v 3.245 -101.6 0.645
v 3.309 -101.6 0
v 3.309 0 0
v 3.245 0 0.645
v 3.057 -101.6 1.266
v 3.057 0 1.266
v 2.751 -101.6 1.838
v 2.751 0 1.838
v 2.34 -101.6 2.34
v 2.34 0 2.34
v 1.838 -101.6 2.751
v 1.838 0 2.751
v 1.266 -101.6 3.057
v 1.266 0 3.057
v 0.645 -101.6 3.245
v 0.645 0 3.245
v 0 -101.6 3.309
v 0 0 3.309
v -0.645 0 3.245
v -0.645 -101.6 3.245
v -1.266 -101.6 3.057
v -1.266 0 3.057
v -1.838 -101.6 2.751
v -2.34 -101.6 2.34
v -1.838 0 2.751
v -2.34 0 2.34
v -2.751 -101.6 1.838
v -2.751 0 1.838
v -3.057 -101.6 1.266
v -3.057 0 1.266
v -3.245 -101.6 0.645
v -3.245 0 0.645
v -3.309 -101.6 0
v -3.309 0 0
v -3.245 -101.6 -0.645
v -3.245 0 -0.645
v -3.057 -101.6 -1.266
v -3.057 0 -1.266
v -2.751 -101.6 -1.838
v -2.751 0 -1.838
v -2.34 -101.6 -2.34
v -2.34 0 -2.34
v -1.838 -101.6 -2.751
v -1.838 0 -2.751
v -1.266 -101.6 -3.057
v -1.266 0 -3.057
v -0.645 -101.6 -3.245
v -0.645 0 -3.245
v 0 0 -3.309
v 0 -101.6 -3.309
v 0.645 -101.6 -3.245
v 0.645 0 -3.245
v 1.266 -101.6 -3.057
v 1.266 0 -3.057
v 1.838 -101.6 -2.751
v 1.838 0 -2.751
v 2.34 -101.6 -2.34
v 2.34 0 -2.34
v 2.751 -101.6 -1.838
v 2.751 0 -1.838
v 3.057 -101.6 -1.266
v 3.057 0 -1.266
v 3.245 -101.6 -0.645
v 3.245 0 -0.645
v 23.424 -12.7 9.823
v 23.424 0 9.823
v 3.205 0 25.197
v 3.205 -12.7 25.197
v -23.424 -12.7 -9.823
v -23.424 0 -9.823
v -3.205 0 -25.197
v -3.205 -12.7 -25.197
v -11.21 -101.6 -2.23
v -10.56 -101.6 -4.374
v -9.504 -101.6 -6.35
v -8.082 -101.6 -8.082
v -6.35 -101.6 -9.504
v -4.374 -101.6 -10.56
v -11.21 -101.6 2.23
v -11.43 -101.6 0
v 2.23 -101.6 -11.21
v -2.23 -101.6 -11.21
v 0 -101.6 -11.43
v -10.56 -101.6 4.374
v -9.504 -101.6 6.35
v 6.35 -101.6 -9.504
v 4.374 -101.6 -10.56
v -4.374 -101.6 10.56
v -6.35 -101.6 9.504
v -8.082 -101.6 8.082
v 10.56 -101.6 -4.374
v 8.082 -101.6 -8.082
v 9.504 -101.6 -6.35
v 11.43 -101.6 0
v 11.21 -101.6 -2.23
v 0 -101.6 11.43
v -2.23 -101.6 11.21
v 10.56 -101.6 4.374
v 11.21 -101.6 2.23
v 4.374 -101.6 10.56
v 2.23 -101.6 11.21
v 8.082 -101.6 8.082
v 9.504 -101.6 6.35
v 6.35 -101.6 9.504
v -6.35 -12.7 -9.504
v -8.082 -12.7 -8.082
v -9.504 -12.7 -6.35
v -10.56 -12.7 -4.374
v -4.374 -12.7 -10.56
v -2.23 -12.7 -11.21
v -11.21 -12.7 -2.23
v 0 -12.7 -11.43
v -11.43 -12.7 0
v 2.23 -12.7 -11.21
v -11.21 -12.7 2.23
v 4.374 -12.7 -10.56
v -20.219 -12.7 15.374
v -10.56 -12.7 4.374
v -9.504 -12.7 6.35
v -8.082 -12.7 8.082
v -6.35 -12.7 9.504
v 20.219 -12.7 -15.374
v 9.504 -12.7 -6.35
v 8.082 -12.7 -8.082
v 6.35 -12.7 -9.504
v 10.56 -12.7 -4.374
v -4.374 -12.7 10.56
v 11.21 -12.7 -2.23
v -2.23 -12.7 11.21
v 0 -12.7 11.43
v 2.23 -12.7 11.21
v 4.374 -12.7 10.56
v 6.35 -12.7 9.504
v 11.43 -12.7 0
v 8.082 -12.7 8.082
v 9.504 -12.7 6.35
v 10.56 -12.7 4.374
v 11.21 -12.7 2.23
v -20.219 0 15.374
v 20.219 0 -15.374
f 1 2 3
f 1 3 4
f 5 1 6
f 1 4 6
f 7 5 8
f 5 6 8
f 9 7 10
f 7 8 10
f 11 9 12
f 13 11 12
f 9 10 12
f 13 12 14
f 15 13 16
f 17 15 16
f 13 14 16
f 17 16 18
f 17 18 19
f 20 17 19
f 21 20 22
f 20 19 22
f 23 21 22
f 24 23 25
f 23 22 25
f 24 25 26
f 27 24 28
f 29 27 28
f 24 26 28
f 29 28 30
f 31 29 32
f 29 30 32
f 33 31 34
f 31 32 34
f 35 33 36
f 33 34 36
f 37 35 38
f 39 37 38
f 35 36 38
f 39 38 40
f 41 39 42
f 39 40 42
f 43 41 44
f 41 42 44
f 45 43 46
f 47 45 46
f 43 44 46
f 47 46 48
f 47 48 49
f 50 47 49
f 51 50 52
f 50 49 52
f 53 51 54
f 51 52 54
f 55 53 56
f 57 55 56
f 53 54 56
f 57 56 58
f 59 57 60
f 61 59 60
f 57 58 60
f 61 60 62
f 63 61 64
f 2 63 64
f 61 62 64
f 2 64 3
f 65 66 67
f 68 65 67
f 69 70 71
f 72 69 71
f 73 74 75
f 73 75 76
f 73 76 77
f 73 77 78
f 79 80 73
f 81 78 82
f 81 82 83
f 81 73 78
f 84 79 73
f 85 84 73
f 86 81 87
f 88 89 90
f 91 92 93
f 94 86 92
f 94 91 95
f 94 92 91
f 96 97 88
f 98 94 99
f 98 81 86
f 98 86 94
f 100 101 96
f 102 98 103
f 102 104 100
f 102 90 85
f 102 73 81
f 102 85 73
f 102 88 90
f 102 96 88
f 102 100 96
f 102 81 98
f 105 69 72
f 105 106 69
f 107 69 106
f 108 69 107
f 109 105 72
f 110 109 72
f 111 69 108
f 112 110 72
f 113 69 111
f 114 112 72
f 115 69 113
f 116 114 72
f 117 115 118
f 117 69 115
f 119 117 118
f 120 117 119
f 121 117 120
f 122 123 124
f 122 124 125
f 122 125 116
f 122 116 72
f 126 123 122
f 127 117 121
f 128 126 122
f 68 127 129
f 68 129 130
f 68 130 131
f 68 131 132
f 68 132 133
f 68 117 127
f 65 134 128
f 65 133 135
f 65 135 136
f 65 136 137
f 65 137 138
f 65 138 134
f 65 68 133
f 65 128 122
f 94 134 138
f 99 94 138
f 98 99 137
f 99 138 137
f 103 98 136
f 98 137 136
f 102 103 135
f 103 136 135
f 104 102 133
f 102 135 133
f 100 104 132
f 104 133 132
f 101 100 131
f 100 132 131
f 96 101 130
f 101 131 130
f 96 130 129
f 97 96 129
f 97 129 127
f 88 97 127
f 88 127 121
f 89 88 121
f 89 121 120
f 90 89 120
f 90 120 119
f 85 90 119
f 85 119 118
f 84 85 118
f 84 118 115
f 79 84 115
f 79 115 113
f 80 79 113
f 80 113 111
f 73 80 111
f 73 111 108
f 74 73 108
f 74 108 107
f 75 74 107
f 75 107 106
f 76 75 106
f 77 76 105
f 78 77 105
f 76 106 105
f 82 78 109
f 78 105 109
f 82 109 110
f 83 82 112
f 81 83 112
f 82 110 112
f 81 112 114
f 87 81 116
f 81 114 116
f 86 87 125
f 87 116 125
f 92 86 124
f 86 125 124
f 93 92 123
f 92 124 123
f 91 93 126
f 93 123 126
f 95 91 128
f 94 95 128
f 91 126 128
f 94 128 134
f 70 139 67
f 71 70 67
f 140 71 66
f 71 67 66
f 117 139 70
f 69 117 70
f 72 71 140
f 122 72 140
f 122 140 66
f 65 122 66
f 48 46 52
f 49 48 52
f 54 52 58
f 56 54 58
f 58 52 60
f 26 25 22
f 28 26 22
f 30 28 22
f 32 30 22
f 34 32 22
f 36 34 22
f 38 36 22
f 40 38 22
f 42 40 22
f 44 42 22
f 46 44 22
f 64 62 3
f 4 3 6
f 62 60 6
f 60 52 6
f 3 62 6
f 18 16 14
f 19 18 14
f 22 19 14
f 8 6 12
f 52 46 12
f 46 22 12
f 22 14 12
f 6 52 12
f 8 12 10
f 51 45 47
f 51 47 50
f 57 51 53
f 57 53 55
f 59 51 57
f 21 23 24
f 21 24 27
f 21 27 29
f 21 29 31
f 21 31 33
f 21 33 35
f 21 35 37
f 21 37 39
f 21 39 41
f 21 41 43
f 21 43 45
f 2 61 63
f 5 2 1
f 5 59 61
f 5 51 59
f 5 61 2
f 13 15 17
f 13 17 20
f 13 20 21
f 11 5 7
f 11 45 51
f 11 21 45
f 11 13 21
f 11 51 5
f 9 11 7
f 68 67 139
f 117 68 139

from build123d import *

# Parameters (mm, degrees)
F1_DEPTH = 12.7
F2_R     = 11.43
F3_DEPTH = 101.6
F4_R     = 3.308684
F5_DEPTH = 101.6


with BuildPart() as f1:
    # F0 (on Front) → F1 (new body)
    with BuildSketch(Plane.XZ):
        Polygon((3.205024, 25.19698), (-20.218713, 15.374123), (-23.423737, -9.822858), (-3.205024, -25.19698), (20.218713, -15.374123), (23.423737, 9.822858), align=None)
    extrude(amount=F1_DEPTH)

    # F2 (on Front) → F3 (join)
    with BuildSketch(Plane.XZ):
        Circle(F2_R)
    extrude(amount=F3_DEPTH)


with BuildPart() as f5:
    # F4 (on Front) → F5 (new body)
    with BuildSketch(Plane.XZ):
        Circle(F4_R)
    extrude(amount=F5_DEPTH)


solid = Compound([f1.part, f5.part])
